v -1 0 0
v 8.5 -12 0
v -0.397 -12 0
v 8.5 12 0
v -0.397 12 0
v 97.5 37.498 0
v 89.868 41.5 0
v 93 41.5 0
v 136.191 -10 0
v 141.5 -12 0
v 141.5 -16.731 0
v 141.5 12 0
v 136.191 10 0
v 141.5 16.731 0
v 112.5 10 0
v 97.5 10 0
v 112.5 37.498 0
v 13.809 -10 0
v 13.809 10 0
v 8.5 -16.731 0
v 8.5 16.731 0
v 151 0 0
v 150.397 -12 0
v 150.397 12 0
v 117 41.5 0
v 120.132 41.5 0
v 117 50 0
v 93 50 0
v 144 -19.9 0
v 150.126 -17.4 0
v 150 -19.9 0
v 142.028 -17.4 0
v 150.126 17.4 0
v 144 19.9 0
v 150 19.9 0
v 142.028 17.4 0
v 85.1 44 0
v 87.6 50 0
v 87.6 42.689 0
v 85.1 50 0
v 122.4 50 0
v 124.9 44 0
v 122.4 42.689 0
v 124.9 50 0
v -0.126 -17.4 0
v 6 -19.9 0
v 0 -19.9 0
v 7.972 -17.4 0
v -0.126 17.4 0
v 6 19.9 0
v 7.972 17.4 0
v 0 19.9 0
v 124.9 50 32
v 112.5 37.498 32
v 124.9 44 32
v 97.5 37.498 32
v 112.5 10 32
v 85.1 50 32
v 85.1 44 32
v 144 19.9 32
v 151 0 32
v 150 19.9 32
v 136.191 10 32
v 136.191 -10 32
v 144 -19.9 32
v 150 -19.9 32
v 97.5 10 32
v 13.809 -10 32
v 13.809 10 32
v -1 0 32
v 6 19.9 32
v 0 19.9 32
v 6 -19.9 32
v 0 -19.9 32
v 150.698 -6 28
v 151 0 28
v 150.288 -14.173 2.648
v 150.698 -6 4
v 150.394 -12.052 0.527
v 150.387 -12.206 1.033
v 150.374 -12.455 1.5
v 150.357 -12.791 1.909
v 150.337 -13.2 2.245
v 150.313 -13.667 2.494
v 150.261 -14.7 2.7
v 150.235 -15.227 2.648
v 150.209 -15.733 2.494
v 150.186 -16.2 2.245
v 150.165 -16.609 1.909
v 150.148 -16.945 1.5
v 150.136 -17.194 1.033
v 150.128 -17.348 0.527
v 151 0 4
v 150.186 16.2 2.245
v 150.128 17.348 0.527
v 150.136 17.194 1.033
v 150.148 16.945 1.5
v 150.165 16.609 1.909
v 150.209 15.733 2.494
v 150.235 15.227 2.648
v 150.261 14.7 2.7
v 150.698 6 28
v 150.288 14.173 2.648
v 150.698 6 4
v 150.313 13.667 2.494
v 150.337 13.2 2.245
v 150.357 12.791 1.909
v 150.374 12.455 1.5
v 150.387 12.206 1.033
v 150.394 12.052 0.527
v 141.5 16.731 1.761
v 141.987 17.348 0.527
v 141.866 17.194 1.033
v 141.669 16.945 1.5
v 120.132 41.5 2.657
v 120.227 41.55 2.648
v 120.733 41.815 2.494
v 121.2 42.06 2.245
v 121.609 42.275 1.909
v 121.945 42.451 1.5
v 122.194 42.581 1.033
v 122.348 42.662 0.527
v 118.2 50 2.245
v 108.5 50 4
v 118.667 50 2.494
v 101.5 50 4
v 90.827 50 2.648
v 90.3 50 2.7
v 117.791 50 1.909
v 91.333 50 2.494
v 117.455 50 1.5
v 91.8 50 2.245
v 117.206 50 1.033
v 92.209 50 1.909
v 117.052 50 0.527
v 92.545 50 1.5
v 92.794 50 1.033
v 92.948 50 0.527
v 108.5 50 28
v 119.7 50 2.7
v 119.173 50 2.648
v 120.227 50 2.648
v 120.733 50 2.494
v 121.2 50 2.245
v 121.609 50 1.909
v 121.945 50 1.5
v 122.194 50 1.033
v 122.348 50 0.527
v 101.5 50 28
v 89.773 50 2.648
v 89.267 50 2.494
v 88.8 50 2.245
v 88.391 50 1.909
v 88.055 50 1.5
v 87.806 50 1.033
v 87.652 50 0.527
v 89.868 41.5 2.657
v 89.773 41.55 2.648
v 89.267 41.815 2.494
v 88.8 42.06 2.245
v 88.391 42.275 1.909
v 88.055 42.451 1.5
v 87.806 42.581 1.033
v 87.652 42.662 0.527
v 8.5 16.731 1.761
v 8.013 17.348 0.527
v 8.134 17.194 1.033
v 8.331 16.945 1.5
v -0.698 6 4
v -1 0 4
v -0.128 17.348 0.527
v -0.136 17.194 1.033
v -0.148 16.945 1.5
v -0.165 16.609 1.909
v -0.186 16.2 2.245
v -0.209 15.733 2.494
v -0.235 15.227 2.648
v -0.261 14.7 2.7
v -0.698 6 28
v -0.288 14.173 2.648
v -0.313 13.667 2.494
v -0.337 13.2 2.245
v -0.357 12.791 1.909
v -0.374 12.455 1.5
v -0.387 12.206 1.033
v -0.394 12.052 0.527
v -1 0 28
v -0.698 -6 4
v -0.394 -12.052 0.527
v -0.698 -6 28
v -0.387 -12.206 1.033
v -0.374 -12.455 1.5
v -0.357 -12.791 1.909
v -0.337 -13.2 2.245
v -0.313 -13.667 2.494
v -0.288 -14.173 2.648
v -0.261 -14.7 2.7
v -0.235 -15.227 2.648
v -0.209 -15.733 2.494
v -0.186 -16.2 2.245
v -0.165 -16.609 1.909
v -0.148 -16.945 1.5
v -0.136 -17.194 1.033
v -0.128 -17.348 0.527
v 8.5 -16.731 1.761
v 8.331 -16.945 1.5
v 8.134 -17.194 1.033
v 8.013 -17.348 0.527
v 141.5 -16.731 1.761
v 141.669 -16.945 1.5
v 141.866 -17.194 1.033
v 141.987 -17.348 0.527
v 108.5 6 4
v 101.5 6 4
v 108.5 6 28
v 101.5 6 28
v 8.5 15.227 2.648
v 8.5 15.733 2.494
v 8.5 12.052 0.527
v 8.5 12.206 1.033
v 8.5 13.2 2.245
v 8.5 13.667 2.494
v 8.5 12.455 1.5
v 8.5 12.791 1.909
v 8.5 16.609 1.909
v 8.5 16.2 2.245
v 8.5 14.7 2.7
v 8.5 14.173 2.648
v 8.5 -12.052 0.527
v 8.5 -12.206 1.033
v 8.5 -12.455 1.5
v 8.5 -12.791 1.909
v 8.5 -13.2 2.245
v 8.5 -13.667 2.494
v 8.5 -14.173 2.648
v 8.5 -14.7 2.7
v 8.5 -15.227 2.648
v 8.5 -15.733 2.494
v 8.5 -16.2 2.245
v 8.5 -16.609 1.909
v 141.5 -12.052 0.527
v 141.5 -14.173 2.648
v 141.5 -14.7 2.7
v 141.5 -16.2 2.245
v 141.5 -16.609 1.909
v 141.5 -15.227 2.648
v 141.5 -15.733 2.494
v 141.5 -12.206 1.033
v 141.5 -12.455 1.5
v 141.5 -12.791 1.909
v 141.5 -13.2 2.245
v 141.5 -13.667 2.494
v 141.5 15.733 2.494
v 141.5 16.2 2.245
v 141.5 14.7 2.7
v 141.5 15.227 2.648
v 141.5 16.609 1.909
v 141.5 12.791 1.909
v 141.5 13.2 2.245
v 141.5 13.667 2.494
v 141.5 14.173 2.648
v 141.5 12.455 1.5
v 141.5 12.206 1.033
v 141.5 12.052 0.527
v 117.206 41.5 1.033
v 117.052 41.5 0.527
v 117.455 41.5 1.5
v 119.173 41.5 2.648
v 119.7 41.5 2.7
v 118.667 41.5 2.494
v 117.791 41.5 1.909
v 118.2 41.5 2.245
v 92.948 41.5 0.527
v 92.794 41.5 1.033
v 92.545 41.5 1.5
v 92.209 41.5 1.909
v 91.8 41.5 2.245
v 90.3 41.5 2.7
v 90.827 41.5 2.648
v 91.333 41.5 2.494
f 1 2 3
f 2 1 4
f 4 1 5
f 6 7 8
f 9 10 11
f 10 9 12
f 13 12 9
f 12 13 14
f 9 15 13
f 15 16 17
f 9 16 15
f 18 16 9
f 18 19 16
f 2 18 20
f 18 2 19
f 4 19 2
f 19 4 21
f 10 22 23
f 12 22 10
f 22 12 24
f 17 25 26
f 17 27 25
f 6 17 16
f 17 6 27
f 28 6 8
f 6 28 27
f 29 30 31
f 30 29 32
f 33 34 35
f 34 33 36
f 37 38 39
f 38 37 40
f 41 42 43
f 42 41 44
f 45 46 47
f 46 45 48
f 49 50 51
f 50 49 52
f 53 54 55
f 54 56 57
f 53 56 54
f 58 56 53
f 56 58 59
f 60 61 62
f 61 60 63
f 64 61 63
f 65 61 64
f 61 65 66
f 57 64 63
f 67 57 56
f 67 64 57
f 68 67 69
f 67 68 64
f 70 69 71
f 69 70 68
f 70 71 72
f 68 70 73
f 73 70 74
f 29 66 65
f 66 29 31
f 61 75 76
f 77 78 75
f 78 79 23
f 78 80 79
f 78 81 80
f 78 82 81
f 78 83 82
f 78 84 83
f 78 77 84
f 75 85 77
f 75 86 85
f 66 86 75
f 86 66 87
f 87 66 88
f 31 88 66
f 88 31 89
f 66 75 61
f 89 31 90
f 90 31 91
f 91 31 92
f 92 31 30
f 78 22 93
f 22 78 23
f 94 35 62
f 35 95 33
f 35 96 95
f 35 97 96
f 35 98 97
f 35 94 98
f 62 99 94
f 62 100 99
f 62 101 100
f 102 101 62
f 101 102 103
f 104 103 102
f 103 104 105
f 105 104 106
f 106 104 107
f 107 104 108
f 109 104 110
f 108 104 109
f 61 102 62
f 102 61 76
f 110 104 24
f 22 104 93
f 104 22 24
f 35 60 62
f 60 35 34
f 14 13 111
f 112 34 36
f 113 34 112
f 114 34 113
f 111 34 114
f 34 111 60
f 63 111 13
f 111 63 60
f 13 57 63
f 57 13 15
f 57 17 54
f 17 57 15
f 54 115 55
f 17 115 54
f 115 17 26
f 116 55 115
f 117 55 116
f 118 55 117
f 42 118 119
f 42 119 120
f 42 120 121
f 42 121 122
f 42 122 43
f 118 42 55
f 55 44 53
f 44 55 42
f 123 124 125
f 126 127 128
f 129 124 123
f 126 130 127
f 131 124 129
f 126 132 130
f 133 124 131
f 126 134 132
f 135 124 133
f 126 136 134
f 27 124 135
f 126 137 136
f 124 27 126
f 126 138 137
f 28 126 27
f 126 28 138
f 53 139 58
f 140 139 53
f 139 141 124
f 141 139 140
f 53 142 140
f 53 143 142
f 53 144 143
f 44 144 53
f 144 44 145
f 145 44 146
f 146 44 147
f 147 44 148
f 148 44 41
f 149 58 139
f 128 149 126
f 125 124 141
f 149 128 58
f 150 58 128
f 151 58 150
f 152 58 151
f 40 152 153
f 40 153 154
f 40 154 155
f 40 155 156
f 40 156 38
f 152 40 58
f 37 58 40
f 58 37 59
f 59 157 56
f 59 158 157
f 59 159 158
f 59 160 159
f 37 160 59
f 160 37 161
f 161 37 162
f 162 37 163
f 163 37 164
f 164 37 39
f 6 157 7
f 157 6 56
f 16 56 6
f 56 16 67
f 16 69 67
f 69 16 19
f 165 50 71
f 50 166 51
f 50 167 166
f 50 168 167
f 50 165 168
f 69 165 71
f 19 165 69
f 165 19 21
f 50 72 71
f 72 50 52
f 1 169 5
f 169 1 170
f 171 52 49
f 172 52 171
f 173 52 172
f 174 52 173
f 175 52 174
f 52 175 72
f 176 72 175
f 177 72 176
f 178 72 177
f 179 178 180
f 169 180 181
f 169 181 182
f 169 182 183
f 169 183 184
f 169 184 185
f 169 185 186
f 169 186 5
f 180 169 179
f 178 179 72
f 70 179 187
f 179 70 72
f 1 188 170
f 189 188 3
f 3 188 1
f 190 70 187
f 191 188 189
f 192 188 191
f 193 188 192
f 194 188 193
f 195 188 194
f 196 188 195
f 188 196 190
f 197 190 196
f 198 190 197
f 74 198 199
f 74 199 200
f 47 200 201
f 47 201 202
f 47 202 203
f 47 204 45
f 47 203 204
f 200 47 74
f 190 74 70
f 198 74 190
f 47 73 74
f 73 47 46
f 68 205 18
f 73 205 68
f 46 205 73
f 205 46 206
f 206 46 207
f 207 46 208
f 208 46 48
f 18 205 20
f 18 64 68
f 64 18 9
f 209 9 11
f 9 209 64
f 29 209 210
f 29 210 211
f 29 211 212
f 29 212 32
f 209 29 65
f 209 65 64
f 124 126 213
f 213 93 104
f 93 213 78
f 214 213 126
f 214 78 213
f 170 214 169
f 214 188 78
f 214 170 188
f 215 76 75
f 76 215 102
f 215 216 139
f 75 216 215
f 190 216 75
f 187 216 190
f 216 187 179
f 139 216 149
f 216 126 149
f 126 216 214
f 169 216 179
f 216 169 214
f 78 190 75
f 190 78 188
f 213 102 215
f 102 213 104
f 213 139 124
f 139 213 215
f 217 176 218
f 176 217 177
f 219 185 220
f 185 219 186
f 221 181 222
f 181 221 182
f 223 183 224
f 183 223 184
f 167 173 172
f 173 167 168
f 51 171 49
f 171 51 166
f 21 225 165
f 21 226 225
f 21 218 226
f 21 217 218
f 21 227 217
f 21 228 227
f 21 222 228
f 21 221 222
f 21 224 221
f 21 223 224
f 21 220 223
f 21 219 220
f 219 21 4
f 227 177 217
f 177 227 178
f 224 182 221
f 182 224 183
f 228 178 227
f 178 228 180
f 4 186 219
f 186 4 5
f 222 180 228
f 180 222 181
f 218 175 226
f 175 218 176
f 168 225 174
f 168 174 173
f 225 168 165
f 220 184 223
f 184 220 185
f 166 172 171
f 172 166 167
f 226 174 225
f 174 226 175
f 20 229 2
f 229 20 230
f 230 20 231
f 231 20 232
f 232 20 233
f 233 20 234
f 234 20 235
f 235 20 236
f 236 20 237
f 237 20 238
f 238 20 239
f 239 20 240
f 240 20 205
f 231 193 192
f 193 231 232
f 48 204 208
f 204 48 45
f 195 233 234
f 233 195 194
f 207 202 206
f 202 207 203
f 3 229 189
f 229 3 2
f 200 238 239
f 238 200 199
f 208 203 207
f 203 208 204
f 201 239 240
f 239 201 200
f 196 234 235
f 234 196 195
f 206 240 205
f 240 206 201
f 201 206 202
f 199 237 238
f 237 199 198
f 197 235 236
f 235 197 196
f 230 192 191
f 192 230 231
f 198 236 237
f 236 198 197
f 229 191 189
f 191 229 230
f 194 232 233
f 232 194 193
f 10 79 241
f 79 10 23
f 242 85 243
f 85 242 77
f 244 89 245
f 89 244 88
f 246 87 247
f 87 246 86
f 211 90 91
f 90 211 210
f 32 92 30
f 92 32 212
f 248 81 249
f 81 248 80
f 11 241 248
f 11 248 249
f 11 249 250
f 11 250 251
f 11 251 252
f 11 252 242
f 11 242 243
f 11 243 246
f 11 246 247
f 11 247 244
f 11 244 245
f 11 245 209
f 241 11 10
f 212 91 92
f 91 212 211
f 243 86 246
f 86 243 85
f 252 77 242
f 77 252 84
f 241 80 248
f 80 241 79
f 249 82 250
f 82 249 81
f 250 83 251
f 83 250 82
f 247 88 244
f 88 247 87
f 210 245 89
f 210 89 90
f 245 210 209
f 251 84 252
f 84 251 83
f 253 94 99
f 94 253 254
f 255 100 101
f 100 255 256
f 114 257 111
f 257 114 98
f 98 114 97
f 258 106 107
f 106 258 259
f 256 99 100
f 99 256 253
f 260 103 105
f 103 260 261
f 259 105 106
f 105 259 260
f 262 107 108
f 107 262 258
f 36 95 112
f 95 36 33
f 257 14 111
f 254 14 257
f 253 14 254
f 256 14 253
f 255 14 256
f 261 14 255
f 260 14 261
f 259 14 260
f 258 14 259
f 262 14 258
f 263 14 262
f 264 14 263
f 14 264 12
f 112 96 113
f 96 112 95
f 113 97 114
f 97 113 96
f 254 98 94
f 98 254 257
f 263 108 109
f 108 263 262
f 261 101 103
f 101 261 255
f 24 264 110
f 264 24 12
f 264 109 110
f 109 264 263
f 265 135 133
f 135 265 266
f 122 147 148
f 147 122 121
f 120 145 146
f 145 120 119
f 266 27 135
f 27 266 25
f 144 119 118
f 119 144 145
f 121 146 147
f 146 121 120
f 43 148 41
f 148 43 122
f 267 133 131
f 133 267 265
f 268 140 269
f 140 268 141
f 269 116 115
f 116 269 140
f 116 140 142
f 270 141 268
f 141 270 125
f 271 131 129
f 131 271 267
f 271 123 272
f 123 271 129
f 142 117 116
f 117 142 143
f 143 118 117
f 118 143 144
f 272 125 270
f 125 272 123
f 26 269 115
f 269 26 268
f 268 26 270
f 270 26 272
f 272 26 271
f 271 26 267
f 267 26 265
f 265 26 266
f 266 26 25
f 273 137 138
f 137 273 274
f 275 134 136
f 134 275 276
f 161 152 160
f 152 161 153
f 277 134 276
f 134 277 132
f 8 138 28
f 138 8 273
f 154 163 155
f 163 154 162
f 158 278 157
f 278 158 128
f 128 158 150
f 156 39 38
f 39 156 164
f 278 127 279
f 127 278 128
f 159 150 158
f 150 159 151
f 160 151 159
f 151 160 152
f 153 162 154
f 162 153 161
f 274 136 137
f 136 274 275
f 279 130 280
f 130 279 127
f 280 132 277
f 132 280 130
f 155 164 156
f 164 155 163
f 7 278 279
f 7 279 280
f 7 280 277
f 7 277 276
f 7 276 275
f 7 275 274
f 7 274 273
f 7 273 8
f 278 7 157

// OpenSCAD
$fn = 32;

// ----------------------------------------------------------------------
// Air duct: 20 mm duct, 4 mm wall, 32 mm across
// ----------------------------------------------------------------------

// --- parameters (mm) ---
duct_r = 10;              // duct core radius
duct_d = 20;              // duct core diameter
wall = 4;                 // duct wall thickness
height = 32;              // duct width (extrusion height)
port_r = 19.9;            // port flange half width
port_d = 39.8;            // port flange width
port_t = 6;               // port flange thickness
bolt_d = 5.4;             // port bolt holes
bolt_offset = 14.7;       // bolt hole offset from the port axis
branch_r = 7.5;           // branch core radius
branch_d = 15;            // branch core diameter
branch_len = 50;          // branch length from the run axis

difference() {
  /* outer hull chain: tube with a flat flange plate at every port */
  linear_extrude(height = 32) {
    hull() {
      polygon([[0, -19.9], [0, 19.9], [6, 19.9], [6, -19.9]]);
      translate([9, 0]) circle(r = 10);
    }
    hull() {
      translate([9, 0]) circle(r = 10);
      translate([45, 0]) circle(r = 10);
    }
    hull() {
      translate([45, 0]) circle(r = 10);
      translate([105, 0]) circle(r = 10);
    }
    hull() {
      translate([105, 0]) circle(r = 10);
      translate([141, 0]) circle(r = 10);
    }
    hull() {
      translate([141, 0]) circle(r = 10);
      polygon([[150, 19.9], [150, -19.9], [144, -19.9], [144, 19.9]]);
    }
    hull() {
      translate([105, 0]) circle(r = 7.5);
      translate([105, 27.5]) circle(r = 7.5);
    }
    hull() {
      translate([105, 27.5]) circle(r = 7.5);
      translate([105, 42]) circle(r = 7.5);
    }
    hull() {
      translate([105, 42]) circle(r = 7.5);
      polygon([[85.1, 50], [124.9, 50], [124.9, 44], [85.1, 44]]);
    }
  }
  /* air passage: the same chain inset by the wall, 5 mm proud of the ports */
  translate([0, 0, 4]) linear_extrude(height = 24) {
    hull() {
      translate([-5, 0]) circle(r = 6);
      translate([45, 0]) circle(r = 6);
    }
    hull() {
      translate([45, 0]) circle(r = 6);
      translate([105, 0]) circle(r = 6);
    }
    hull() {
      translate([105, 0]) circle(r = 6);
      translate([155, 0]) circle(r = 6);
    }
    hull() {
      translate([105, 0]) circle(r = 3.5);
      translate([105, 27.5]) circle(r = 3.5);
    }
    hull() {
      translate([105, 27.5]) circle(r = 3.5);
      translate([105, 55]) circle(r = 3.5);
    }
  }
  translate([0, 0]) rotate([0, 0, -90]) translate([-14.7, -2.5]) rotate([-90, 0, 0]) cylinder(h = 11, d = 5.4);
  translate([0, 0]) rotate([0, 0, -90]) translate([14.7, -2.5]) rotate([-90, 0, 0]) cylinder(h = 11, d = 5.4);
  translate([150, 0]) rotate([0, 0, 90]) translate([-14.7, -2.5]) rotate([-90, 0, 0]) cylinder(h = 11, d = 5.4);
  translate([150, 0]) rotate([0, 0, 90]) translate([14.7, -2.5]) rotate([-90, 0, 0]) cylinder(h = 11, d = 5.4);
  translate([105, 50]) rotate([0, 0, 180]) translate([-14.7, -2.5]) rotate([-90, 0, 0]) cylinder(h = 11, d = 5.4);
  translate([105, 50]) rotate([0, 0, 180]) translate([14.7, -2.5]) rotate([-90, 0, 0]) cylinder(h = 11, d = 5.4);
}
